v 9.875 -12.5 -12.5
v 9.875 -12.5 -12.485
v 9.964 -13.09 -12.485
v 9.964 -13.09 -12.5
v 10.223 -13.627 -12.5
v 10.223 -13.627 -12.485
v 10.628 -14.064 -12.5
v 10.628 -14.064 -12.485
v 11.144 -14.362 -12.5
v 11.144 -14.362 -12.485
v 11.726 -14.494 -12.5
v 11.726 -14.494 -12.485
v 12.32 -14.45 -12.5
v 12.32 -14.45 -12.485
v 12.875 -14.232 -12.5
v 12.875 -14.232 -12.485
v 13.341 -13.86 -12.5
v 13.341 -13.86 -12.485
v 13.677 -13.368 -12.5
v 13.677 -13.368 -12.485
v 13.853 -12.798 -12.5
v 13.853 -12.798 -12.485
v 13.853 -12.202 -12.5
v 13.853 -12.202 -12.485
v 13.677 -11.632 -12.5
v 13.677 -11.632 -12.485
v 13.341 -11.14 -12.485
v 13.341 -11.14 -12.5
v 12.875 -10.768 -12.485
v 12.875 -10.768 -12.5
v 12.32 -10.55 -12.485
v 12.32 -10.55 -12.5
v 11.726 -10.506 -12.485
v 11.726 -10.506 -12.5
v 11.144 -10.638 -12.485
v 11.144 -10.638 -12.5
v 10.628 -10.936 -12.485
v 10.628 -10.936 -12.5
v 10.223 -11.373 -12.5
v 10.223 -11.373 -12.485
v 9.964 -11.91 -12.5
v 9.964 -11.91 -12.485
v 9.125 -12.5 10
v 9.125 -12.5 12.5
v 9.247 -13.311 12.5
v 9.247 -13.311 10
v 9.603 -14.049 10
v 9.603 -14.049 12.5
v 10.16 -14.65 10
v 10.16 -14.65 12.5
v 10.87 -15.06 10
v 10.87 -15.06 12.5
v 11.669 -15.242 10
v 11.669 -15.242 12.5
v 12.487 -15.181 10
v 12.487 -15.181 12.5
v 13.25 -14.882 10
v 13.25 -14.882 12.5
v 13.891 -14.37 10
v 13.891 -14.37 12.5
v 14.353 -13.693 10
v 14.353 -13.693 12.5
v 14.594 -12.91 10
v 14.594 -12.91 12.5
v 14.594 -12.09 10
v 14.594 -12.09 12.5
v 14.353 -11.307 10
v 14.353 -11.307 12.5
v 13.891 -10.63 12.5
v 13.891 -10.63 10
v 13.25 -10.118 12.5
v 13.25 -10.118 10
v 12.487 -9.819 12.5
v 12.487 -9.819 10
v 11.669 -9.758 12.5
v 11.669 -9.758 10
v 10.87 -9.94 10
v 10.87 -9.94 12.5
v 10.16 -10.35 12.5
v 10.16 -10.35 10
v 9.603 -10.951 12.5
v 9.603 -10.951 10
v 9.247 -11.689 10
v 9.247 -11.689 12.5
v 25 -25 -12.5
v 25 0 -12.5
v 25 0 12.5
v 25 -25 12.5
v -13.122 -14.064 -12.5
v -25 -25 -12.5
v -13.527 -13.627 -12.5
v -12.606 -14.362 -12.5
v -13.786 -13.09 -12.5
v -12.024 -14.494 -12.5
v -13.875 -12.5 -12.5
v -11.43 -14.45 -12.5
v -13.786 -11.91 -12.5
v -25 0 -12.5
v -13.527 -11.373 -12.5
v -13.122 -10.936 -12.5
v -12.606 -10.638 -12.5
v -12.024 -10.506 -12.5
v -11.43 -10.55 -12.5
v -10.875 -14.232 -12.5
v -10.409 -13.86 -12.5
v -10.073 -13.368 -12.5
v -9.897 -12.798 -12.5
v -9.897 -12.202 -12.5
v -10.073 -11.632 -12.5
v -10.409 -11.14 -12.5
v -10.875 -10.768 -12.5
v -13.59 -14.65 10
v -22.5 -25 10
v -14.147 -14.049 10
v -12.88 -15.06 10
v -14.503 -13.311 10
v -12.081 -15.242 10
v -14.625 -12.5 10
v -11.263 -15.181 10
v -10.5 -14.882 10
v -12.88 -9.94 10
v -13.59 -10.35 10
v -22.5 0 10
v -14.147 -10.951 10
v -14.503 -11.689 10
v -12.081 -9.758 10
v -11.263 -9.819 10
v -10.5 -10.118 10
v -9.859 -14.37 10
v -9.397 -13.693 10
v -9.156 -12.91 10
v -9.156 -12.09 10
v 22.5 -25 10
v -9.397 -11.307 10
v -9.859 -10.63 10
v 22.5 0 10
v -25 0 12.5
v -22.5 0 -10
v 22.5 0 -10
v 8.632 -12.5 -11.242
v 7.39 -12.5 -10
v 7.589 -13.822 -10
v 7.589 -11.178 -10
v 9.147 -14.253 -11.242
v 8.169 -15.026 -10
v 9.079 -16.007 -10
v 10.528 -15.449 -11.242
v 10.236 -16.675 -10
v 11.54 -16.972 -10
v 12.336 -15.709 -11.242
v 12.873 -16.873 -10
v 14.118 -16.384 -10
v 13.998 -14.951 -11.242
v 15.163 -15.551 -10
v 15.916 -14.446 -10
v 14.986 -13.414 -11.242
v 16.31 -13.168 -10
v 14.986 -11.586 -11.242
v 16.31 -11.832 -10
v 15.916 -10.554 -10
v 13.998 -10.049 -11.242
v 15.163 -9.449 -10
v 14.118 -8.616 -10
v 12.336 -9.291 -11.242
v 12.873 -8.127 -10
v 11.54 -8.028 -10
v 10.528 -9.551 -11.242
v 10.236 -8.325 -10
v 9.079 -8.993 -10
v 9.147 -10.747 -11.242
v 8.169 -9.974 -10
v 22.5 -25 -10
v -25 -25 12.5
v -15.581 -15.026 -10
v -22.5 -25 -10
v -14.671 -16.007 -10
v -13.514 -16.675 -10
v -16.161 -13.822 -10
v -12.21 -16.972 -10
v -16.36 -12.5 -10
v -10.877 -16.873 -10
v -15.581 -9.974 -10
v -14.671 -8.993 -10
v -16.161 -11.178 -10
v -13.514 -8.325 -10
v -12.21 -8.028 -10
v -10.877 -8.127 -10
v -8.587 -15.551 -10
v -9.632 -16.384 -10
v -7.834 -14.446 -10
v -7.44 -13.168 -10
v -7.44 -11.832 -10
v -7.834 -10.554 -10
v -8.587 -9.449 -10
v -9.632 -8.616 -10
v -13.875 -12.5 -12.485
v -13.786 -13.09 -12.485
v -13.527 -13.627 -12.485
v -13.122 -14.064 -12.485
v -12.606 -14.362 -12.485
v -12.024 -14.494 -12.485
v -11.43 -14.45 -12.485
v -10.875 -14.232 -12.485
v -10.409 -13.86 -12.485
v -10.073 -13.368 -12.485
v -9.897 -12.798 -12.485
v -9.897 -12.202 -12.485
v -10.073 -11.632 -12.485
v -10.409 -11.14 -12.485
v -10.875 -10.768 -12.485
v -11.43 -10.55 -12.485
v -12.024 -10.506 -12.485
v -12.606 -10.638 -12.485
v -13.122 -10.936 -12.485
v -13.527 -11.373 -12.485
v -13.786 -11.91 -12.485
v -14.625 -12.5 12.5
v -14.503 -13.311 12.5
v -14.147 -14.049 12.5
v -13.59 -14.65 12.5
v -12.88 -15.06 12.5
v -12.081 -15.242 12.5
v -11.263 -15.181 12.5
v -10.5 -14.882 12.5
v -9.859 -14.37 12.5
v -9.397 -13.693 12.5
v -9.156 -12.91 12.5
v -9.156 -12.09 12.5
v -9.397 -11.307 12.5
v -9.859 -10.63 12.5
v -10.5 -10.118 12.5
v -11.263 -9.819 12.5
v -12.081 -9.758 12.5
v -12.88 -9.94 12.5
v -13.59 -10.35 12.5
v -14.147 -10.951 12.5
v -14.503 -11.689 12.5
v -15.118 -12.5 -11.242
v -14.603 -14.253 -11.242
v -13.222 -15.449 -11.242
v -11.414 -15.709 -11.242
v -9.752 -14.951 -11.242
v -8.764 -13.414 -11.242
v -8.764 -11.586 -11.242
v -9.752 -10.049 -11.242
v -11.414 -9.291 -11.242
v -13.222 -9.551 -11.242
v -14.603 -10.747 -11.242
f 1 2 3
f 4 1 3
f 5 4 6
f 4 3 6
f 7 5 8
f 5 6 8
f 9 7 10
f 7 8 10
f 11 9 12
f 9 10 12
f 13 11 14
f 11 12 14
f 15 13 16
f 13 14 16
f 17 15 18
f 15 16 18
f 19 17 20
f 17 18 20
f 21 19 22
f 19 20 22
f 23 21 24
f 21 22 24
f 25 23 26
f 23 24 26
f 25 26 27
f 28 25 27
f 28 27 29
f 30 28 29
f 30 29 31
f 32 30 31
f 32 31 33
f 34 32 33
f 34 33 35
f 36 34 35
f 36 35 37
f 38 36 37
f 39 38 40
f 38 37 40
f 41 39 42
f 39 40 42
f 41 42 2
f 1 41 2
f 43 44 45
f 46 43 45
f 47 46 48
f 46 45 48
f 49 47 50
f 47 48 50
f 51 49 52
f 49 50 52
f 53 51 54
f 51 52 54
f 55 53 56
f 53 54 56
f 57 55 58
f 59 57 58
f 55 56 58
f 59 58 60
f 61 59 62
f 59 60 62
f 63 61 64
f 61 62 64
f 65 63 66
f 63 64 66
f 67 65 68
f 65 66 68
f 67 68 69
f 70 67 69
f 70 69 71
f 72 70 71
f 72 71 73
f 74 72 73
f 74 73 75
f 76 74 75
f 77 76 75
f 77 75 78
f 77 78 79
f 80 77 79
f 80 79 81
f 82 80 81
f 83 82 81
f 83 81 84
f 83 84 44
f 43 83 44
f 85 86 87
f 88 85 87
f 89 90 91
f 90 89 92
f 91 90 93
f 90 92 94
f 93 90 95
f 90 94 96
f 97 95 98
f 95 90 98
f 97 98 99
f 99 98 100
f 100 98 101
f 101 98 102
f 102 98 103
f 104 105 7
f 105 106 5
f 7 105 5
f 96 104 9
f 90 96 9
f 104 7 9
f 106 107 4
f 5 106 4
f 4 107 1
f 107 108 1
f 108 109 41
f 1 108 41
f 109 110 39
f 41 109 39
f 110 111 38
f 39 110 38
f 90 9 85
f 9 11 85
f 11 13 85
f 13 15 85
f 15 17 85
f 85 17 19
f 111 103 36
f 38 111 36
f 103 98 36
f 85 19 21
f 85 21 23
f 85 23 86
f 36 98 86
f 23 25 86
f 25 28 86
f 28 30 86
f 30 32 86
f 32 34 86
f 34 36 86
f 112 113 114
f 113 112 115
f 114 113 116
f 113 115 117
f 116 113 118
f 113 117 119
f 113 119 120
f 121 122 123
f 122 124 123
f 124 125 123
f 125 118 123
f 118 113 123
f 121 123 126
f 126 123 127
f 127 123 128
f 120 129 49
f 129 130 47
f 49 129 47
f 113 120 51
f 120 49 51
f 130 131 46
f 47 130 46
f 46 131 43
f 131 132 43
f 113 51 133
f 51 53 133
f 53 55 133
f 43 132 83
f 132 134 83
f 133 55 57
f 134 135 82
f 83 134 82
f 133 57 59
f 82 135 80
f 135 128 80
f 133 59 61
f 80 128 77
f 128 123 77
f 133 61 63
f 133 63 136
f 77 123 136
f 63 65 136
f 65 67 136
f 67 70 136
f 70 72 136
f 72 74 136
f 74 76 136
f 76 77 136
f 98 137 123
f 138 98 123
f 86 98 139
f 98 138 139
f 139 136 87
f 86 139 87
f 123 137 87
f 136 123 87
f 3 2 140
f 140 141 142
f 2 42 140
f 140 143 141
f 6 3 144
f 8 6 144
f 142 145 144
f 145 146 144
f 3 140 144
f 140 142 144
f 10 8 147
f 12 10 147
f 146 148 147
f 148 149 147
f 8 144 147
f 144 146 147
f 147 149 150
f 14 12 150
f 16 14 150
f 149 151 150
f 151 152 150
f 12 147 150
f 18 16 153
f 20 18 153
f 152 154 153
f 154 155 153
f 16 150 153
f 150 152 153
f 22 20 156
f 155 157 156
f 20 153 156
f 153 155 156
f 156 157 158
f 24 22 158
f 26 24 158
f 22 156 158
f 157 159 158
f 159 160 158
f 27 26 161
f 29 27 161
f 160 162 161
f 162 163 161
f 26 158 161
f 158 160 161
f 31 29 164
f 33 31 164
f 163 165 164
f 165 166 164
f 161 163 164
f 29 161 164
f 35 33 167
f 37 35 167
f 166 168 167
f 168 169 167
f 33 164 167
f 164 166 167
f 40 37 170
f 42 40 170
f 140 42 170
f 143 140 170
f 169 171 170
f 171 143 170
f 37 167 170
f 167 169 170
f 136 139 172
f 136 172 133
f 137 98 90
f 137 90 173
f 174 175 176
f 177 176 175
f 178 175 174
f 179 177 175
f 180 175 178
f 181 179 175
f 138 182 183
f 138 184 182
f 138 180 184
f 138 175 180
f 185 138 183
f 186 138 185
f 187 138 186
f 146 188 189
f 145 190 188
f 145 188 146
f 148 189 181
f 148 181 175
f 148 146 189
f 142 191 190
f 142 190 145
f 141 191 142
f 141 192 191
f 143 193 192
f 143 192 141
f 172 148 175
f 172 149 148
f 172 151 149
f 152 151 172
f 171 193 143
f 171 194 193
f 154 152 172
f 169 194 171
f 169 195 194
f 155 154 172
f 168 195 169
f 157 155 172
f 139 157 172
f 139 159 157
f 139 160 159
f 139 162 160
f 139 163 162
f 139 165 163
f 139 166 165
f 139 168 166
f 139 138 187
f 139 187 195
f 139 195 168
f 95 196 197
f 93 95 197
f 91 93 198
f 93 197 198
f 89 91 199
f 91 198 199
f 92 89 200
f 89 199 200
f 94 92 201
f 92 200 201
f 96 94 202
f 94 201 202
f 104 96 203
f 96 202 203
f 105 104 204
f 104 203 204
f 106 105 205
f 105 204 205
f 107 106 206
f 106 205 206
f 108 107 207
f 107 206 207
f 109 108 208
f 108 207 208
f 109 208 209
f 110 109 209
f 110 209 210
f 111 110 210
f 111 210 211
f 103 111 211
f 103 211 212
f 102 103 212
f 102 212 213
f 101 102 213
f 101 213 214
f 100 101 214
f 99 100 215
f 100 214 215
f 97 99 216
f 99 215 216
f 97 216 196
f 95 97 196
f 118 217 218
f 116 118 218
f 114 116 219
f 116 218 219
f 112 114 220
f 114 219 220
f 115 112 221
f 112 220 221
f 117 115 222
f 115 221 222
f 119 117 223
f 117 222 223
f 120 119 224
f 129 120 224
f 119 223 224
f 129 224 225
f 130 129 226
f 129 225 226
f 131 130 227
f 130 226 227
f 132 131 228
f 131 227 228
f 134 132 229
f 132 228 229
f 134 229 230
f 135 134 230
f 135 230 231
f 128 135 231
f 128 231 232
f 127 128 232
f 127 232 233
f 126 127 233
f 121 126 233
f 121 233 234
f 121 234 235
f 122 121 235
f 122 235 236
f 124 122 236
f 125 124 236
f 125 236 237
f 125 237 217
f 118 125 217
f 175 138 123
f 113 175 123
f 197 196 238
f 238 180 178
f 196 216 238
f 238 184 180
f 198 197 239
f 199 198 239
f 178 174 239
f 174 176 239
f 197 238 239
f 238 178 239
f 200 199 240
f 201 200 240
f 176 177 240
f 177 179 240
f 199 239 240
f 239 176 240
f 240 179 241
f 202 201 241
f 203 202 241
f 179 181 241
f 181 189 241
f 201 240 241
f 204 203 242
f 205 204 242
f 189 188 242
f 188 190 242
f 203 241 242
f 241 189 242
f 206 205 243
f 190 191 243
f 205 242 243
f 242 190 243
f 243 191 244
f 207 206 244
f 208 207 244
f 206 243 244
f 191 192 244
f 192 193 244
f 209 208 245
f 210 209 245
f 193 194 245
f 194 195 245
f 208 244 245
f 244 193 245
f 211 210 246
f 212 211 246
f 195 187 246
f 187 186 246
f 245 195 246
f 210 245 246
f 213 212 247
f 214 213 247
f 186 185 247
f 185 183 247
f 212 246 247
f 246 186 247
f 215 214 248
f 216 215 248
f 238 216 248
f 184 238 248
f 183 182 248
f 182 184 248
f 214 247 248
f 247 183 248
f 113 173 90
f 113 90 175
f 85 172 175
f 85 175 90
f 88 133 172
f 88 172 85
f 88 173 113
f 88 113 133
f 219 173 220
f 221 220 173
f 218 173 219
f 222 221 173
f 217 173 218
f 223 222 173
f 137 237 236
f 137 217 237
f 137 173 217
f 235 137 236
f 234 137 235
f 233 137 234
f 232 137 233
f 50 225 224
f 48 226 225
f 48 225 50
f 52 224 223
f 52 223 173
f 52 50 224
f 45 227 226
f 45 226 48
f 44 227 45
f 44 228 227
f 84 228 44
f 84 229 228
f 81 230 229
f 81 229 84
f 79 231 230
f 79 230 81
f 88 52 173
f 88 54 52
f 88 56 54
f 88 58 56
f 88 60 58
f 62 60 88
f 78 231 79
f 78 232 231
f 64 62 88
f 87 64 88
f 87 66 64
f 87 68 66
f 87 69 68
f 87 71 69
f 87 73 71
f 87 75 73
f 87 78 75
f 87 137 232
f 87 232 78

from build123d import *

# Parameters (mm, degrees)
SKETCH_W          = 50
SKETCH_H          = 25
PAD_DEPTH         = 25
SKETCH001_W       = 45
SKETCH001_H       = 20
POCKET_DEPTH      = 0.001
POCKET_DEPTH_BACK = 25.001
SKETCH002_R       = 2.75
POCKET001_DEPTH   = 3.5
SKETCH003_R       = 2
POCKET002_DEPTH   = 2.5
CHAMFER_SIZE      = 2.485


with BuildPart() as part:
    # Sketch → Pad (new body)
    with BuildSketch(Plane.XZ):
        Rectangle(SKETCH_W, SKETCH_H)
    extrude(amount=PAD_DEPTH)

    # Sketch001 → Pocket (cut, two sides)
    with BuildSketch(Plane.XZ) as pocket_sk:
        Rectangle(SKETCH001_W, SKETCH001_H)
    extrude(amount=-POCKET_DEPTH, mode=Mode.SUBTRACT)
    extrude(pocket_sk.sketch, amount=POCKET_DEPTH_BACK, mode=Mode.SUBTRACT)

    # Sketch002 (on DatumPlane) → Pocket001 (cut)
    with BuildSketch(Plane(origin=(0, 0, 12.5), x_dir=(-1, 0, 0), z_dir=(0, 0, 1))):
        with Locations((-11.875, 12.5)):
            Circle(SKETCH002_R)
        with Locations((11.875, 12.5)):
            Circle(SKETCH002_R)
    extrude(amount=-POCKET001_DEPTH, mode=Mode.SUBTRACT)

    # Sketch003 (on DatumPlane) → Pocket002 (cut)
    with BuildSketch(Plane(origin=(0, 0, -10), x_dir=(-1, 0, 0), z_dir=(0, 0, 1))):
        with Locations((-11.875, 12.5)):
            Circle(SKETCH003_R)
        with Locations((11.875, 12.5)):
            Circle(SKETCH003_R)
    extrude(amount=-POCKET002_DEPTH, mode=Mode.SUBTRACT)

    # Chamfer
    chamfer_edges = [part.edges().sort_by_distance(p)[0] for p in [
        (-9.875, -12.5, -10),
        (13.875, -12.5, -10),
    ]]
    chamfer(chamfer_edges, length=CHAMFER_SIZE)


solid = part.part
